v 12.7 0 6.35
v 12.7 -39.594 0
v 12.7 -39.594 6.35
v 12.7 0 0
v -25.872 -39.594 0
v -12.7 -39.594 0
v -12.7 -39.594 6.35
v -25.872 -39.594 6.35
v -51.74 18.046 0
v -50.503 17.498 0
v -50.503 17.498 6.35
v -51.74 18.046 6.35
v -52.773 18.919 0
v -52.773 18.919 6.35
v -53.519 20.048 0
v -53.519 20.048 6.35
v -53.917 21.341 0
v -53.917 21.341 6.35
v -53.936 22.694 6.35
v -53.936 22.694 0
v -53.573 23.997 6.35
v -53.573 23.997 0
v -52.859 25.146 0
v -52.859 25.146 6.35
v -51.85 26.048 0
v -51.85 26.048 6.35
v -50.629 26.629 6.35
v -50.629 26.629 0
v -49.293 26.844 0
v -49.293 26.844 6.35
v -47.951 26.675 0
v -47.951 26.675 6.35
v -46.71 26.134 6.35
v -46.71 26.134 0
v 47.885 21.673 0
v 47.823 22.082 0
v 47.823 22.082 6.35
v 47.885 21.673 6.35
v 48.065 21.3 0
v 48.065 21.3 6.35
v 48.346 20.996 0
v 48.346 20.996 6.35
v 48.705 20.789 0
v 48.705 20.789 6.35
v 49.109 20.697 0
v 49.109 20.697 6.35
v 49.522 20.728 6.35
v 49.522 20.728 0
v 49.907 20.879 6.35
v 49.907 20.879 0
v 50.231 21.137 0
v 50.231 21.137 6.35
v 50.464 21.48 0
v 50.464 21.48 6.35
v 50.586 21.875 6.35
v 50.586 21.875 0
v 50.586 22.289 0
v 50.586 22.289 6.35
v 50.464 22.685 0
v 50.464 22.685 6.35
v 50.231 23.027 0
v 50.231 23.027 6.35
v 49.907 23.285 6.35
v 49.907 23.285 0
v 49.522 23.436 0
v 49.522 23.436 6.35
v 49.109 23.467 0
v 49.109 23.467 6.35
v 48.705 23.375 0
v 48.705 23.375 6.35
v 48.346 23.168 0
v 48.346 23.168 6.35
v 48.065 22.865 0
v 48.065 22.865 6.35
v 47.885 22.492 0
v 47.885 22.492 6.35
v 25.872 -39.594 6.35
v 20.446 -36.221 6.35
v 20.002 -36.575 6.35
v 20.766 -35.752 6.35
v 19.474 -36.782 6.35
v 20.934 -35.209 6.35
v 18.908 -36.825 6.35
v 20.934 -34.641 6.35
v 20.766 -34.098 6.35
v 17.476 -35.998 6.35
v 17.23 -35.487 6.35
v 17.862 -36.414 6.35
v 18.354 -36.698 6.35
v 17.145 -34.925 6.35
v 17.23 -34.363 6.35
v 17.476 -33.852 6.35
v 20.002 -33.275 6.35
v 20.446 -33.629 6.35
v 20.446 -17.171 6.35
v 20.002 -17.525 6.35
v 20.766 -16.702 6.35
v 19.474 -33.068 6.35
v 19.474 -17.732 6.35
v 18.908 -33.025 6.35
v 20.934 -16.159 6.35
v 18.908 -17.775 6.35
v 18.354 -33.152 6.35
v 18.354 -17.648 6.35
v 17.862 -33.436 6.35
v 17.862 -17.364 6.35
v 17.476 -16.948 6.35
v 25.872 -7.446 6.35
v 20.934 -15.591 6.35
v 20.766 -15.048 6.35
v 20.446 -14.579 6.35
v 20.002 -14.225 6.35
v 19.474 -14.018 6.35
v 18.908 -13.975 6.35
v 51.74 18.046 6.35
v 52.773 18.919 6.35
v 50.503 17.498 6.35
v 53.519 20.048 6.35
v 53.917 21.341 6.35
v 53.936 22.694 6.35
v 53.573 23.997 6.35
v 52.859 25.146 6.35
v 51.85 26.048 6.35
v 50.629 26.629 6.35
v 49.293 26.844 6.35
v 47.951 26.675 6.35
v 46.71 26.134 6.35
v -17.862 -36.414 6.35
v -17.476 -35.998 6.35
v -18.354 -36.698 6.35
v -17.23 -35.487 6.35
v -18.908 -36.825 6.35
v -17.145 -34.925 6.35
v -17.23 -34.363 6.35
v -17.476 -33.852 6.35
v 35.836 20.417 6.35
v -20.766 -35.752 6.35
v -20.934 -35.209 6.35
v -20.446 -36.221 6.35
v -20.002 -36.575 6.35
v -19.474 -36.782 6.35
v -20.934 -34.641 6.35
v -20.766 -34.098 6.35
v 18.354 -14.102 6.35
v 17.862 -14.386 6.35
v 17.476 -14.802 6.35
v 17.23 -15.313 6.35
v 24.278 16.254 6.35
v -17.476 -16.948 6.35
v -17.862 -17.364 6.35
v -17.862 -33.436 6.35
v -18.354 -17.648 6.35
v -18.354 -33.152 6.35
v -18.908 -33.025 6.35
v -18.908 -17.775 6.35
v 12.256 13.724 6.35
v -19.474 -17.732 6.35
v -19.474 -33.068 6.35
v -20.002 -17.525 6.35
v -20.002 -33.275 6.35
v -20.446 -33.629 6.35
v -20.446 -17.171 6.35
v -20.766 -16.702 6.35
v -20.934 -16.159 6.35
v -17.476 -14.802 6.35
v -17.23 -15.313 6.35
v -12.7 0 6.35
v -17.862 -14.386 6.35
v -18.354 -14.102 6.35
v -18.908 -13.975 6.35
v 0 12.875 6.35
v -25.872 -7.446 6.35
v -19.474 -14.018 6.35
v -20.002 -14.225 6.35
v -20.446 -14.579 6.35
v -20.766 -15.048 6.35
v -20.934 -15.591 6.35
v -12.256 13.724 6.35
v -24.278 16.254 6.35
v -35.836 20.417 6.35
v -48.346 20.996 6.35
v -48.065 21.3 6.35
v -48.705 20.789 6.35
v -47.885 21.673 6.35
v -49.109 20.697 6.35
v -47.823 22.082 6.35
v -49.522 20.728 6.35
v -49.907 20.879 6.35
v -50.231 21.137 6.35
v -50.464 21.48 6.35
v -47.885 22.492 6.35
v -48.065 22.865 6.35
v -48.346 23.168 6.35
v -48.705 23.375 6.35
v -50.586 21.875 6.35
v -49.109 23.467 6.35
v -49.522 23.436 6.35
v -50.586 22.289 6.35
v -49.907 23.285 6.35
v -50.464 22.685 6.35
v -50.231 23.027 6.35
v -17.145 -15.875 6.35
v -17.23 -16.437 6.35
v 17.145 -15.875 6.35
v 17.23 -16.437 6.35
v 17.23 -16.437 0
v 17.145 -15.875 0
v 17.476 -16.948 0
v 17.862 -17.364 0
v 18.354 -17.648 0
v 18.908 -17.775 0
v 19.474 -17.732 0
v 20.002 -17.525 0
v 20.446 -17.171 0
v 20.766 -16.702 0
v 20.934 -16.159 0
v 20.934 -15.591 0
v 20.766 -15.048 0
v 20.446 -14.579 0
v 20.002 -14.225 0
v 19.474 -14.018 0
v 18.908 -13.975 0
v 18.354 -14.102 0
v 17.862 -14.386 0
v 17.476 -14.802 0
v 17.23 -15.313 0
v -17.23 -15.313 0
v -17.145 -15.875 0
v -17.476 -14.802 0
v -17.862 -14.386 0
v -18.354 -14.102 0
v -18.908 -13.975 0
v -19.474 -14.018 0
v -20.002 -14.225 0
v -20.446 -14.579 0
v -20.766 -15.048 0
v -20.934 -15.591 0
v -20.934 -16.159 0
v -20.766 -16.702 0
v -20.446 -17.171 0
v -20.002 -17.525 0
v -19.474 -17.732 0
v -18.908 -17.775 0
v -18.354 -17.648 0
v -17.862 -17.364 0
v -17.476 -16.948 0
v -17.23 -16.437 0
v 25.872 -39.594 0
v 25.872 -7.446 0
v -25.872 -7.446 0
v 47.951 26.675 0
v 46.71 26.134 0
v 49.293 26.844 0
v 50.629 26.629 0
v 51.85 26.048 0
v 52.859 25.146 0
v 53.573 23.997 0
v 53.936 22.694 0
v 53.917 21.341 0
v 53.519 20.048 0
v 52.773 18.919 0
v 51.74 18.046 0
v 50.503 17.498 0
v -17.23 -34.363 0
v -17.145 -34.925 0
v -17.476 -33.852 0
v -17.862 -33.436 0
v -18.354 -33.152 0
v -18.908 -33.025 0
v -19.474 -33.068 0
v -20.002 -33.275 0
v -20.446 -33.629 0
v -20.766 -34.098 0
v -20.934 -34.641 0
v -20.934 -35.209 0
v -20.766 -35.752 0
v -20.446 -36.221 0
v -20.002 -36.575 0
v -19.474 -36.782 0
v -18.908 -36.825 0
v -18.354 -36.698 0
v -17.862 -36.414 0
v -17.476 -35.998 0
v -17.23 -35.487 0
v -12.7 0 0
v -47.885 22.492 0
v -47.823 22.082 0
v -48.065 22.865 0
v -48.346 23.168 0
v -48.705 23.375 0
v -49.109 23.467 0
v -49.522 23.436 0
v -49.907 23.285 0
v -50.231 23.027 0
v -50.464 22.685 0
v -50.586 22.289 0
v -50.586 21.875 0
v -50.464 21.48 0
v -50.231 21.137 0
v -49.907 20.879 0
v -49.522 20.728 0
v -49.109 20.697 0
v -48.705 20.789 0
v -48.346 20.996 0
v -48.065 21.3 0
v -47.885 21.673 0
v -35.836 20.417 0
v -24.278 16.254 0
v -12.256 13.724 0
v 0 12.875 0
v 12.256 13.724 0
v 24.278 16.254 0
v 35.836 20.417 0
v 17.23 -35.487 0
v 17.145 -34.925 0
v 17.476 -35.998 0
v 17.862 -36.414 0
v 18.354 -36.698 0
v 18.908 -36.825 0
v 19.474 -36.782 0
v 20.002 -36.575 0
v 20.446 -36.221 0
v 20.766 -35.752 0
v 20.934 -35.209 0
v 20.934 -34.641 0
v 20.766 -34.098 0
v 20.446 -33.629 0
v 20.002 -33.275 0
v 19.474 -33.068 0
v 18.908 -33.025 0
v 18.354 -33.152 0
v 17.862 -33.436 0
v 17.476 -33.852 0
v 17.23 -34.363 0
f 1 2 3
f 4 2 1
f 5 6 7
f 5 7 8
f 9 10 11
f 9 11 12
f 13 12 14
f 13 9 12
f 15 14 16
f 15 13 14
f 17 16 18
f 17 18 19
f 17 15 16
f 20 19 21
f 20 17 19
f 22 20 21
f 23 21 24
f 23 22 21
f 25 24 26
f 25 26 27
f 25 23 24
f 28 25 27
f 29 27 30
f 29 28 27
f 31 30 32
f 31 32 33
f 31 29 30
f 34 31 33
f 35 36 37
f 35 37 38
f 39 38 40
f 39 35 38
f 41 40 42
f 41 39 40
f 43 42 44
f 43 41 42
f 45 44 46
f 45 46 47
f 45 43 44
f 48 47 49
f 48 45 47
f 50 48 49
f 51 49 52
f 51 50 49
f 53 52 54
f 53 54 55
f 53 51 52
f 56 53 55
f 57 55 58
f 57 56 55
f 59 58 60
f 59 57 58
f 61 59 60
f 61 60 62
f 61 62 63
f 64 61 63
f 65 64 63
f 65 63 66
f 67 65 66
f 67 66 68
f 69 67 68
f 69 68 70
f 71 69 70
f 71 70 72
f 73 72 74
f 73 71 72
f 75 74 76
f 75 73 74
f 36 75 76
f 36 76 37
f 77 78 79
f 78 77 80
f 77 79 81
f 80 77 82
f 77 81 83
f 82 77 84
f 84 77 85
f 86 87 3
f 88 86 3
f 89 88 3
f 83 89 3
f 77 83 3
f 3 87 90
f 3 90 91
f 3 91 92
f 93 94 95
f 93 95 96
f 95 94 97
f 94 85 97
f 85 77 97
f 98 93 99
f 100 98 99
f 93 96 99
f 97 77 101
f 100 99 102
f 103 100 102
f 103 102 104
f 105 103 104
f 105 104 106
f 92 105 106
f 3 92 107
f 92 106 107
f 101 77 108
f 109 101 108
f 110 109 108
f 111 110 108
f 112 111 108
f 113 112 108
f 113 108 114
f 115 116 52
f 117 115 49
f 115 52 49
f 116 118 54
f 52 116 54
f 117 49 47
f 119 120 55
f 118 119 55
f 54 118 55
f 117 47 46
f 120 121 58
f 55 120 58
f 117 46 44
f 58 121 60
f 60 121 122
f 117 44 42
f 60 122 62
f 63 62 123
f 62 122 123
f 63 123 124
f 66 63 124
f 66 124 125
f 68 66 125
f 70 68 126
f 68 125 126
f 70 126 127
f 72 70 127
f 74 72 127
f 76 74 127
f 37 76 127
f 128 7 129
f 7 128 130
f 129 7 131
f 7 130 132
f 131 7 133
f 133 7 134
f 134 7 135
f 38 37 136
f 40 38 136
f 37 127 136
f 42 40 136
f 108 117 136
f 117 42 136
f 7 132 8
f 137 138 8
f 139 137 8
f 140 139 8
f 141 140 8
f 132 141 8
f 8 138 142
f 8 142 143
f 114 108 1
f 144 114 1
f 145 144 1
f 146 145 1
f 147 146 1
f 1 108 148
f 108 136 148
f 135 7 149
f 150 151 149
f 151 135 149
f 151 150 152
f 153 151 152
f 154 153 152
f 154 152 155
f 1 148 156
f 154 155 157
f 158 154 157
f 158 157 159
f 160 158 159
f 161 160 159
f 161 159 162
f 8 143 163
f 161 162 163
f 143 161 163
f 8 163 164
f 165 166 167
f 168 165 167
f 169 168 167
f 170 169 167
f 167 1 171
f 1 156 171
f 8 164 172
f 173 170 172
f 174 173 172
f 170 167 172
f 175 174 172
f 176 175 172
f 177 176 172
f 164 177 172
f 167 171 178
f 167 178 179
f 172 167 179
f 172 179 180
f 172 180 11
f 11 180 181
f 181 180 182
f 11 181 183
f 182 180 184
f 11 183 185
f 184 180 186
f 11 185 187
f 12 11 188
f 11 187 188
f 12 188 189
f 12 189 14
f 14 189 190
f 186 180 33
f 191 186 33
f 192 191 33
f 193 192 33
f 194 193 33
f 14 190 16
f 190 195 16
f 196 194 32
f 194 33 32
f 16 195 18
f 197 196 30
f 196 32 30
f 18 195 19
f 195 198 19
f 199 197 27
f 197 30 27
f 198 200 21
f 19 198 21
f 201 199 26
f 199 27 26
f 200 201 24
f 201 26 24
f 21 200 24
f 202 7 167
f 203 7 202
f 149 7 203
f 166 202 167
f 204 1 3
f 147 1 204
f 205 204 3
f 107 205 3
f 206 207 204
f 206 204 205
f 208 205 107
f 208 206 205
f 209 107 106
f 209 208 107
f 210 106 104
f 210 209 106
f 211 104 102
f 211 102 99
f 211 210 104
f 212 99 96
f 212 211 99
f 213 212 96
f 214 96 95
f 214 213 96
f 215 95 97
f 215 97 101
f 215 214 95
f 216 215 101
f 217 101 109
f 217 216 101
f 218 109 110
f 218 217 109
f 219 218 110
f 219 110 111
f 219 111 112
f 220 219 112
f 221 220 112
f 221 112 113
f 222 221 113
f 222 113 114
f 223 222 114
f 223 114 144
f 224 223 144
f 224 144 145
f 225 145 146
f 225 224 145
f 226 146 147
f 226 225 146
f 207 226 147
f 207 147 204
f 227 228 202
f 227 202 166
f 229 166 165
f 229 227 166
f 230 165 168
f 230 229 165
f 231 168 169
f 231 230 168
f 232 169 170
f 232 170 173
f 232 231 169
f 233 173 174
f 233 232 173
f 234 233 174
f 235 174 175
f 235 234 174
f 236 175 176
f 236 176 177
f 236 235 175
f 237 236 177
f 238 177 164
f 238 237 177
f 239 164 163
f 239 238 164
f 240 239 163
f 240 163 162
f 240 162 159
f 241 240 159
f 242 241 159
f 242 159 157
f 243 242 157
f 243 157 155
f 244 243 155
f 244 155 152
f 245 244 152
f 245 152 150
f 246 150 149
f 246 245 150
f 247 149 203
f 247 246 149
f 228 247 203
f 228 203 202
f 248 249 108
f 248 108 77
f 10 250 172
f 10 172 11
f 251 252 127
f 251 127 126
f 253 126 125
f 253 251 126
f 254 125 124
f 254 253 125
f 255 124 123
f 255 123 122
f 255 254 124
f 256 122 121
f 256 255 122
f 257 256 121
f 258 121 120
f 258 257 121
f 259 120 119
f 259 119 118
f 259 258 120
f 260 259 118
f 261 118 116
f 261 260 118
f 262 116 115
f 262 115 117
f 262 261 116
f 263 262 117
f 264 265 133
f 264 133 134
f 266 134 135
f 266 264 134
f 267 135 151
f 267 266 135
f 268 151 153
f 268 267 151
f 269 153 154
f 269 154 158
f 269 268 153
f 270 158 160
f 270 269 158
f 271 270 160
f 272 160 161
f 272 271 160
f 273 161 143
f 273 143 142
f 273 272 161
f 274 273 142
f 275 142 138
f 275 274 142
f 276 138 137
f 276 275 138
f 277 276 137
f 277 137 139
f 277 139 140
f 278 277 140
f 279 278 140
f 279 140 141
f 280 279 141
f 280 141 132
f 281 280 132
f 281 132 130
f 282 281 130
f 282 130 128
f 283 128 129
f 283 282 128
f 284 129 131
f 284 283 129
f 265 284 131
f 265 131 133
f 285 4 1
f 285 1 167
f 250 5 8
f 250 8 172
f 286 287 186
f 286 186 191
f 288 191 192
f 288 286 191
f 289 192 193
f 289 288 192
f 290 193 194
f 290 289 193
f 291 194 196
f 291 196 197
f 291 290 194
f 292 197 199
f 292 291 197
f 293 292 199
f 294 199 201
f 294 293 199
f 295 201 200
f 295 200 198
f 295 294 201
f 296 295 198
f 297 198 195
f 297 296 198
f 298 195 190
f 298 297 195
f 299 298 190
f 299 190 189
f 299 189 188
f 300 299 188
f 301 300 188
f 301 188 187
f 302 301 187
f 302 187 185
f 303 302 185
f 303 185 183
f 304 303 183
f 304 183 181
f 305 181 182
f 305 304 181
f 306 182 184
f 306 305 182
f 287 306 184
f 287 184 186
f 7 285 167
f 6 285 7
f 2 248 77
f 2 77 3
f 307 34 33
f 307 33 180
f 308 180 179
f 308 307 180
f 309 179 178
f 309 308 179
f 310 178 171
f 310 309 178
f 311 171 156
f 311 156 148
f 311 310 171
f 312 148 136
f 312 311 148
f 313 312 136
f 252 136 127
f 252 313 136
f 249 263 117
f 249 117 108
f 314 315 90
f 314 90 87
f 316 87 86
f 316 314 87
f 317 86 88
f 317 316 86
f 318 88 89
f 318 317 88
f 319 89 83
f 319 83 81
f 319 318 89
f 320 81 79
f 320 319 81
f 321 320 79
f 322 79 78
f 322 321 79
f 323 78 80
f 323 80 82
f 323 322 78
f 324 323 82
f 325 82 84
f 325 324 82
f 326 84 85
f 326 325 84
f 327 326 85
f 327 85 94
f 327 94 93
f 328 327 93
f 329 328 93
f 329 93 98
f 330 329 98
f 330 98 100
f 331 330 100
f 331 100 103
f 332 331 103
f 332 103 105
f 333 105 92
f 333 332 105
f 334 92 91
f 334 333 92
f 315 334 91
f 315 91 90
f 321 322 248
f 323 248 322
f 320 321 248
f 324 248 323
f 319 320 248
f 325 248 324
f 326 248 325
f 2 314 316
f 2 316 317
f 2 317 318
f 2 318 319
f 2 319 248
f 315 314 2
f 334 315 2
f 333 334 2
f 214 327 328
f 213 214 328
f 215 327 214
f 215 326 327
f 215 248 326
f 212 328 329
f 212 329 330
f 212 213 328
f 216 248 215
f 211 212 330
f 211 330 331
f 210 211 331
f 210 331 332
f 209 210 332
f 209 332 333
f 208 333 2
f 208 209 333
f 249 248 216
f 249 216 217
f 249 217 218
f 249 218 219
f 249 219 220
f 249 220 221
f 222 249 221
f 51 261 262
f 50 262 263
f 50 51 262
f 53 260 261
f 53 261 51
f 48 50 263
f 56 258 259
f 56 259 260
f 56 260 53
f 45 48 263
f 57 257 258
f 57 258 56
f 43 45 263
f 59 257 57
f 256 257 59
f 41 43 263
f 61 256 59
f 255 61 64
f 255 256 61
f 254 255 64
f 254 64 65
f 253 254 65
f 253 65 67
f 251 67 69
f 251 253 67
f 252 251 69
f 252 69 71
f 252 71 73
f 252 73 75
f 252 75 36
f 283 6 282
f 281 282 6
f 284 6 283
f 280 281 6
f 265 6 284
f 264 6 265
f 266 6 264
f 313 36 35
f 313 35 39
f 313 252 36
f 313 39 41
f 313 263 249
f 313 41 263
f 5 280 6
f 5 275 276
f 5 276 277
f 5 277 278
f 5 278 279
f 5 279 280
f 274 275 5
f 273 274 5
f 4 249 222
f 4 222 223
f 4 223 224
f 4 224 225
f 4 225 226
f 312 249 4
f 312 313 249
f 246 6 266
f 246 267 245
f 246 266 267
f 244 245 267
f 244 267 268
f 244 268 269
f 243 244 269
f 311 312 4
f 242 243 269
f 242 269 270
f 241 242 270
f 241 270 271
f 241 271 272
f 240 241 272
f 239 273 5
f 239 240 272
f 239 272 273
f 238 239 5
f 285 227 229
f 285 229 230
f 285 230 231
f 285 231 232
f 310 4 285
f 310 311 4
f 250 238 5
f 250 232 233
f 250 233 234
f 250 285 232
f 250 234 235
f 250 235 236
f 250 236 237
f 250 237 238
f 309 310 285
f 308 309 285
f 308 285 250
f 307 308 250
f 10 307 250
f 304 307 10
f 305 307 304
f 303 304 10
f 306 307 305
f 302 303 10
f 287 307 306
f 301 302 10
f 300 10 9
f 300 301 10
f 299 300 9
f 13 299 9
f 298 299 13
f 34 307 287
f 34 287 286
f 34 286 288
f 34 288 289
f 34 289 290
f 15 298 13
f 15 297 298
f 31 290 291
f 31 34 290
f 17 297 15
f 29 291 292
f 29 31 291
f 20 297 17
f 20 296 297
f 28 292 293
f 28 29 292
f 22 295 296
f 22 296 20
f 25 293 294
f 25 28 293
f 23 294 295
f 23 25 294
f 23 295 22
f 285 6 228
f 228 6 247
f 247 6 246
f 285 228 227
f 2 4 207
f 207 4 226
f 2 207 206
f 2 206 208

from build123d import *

# Parameters (mm, degrees)
SKETCH1_R           = 1.905
SKETCH1_R_2         = 1.3890625
BOSS_EXTRUDE1_DEPTH = 6.35


with BuildPart() as part:
    # Sketch1 → Boss-Extrude1 (new body)
    with BuildSketch(Plane.XY):
        with BuildLine():
            Line((12.7, 0), (-12.7, 0))
            Line((-12.7, 0), (-12.7, -39.593860647))
            Line((-12.7, -39.593860647), (-25.872163348, -39.593860647))
            Line((-25.872163348, -39.593860647), (-25.872163348, -7.44555378))
            Line((-25.872163348, -7.44555378), (-50.502986928, 17.497884605))
            ThreePointArc((-50.502986928, 17.497884605), (-53.573053894, 23.997146119), (-46.71026588, 26.134399514))
            ThreePointArc((-46.71026588, 26.134399514), (0, 12.874711135), (46.71026588, 26.134399514))
            ThreePointArc((46.71026588, 26.134399514), (53.573053894, 23.997146119), (50.502986928, 17.497884605))
            Line((50.502986928, 17.497884605), (25.872163348, -7.44555378))
            Line((25.872163348, -7.44555378), (25.872163348, -39.593860647))
            Line((25.872163348, -39.593860647), (12.7, -39.593860647))
            Line((12.7, -39.593860647), (12.7, 0))
        make_face()
        with Locations((-19.05, -15.875)):
            Circle(SKETCH1_R, mode=Mode.SUBTRACT)
        with Locations(Location((19.05, -15.875, 0), (0, 0, 180))):
            Circle(SKETCH1_R, mode=Mode.SUBTRACT)
        with Locations((-49.2125, 22.082211135)):
            Circle(SKETCH1_R_2, mode=Mode.SUBTRACT)
        with Locations((-19.05, -34.925)):
            Circle(SKETCH1_R, mode=Mode.SUBTRACT)
        with Locations(Location((19.05, -34.925, 0), (0, 0, 180))):
            Circle(SKETCH1_R, mode=Mode.SUBTRACT)
        with Locations(Location((49.2125, 22.082211135, 0), (0, 0, 180))):
            Circle(SKETCH1_R_2, mode=Mode.SUBTRACT)
    extrude(amount=BOSS_EXTRUDE1_DEPTH)


solid = part.part
